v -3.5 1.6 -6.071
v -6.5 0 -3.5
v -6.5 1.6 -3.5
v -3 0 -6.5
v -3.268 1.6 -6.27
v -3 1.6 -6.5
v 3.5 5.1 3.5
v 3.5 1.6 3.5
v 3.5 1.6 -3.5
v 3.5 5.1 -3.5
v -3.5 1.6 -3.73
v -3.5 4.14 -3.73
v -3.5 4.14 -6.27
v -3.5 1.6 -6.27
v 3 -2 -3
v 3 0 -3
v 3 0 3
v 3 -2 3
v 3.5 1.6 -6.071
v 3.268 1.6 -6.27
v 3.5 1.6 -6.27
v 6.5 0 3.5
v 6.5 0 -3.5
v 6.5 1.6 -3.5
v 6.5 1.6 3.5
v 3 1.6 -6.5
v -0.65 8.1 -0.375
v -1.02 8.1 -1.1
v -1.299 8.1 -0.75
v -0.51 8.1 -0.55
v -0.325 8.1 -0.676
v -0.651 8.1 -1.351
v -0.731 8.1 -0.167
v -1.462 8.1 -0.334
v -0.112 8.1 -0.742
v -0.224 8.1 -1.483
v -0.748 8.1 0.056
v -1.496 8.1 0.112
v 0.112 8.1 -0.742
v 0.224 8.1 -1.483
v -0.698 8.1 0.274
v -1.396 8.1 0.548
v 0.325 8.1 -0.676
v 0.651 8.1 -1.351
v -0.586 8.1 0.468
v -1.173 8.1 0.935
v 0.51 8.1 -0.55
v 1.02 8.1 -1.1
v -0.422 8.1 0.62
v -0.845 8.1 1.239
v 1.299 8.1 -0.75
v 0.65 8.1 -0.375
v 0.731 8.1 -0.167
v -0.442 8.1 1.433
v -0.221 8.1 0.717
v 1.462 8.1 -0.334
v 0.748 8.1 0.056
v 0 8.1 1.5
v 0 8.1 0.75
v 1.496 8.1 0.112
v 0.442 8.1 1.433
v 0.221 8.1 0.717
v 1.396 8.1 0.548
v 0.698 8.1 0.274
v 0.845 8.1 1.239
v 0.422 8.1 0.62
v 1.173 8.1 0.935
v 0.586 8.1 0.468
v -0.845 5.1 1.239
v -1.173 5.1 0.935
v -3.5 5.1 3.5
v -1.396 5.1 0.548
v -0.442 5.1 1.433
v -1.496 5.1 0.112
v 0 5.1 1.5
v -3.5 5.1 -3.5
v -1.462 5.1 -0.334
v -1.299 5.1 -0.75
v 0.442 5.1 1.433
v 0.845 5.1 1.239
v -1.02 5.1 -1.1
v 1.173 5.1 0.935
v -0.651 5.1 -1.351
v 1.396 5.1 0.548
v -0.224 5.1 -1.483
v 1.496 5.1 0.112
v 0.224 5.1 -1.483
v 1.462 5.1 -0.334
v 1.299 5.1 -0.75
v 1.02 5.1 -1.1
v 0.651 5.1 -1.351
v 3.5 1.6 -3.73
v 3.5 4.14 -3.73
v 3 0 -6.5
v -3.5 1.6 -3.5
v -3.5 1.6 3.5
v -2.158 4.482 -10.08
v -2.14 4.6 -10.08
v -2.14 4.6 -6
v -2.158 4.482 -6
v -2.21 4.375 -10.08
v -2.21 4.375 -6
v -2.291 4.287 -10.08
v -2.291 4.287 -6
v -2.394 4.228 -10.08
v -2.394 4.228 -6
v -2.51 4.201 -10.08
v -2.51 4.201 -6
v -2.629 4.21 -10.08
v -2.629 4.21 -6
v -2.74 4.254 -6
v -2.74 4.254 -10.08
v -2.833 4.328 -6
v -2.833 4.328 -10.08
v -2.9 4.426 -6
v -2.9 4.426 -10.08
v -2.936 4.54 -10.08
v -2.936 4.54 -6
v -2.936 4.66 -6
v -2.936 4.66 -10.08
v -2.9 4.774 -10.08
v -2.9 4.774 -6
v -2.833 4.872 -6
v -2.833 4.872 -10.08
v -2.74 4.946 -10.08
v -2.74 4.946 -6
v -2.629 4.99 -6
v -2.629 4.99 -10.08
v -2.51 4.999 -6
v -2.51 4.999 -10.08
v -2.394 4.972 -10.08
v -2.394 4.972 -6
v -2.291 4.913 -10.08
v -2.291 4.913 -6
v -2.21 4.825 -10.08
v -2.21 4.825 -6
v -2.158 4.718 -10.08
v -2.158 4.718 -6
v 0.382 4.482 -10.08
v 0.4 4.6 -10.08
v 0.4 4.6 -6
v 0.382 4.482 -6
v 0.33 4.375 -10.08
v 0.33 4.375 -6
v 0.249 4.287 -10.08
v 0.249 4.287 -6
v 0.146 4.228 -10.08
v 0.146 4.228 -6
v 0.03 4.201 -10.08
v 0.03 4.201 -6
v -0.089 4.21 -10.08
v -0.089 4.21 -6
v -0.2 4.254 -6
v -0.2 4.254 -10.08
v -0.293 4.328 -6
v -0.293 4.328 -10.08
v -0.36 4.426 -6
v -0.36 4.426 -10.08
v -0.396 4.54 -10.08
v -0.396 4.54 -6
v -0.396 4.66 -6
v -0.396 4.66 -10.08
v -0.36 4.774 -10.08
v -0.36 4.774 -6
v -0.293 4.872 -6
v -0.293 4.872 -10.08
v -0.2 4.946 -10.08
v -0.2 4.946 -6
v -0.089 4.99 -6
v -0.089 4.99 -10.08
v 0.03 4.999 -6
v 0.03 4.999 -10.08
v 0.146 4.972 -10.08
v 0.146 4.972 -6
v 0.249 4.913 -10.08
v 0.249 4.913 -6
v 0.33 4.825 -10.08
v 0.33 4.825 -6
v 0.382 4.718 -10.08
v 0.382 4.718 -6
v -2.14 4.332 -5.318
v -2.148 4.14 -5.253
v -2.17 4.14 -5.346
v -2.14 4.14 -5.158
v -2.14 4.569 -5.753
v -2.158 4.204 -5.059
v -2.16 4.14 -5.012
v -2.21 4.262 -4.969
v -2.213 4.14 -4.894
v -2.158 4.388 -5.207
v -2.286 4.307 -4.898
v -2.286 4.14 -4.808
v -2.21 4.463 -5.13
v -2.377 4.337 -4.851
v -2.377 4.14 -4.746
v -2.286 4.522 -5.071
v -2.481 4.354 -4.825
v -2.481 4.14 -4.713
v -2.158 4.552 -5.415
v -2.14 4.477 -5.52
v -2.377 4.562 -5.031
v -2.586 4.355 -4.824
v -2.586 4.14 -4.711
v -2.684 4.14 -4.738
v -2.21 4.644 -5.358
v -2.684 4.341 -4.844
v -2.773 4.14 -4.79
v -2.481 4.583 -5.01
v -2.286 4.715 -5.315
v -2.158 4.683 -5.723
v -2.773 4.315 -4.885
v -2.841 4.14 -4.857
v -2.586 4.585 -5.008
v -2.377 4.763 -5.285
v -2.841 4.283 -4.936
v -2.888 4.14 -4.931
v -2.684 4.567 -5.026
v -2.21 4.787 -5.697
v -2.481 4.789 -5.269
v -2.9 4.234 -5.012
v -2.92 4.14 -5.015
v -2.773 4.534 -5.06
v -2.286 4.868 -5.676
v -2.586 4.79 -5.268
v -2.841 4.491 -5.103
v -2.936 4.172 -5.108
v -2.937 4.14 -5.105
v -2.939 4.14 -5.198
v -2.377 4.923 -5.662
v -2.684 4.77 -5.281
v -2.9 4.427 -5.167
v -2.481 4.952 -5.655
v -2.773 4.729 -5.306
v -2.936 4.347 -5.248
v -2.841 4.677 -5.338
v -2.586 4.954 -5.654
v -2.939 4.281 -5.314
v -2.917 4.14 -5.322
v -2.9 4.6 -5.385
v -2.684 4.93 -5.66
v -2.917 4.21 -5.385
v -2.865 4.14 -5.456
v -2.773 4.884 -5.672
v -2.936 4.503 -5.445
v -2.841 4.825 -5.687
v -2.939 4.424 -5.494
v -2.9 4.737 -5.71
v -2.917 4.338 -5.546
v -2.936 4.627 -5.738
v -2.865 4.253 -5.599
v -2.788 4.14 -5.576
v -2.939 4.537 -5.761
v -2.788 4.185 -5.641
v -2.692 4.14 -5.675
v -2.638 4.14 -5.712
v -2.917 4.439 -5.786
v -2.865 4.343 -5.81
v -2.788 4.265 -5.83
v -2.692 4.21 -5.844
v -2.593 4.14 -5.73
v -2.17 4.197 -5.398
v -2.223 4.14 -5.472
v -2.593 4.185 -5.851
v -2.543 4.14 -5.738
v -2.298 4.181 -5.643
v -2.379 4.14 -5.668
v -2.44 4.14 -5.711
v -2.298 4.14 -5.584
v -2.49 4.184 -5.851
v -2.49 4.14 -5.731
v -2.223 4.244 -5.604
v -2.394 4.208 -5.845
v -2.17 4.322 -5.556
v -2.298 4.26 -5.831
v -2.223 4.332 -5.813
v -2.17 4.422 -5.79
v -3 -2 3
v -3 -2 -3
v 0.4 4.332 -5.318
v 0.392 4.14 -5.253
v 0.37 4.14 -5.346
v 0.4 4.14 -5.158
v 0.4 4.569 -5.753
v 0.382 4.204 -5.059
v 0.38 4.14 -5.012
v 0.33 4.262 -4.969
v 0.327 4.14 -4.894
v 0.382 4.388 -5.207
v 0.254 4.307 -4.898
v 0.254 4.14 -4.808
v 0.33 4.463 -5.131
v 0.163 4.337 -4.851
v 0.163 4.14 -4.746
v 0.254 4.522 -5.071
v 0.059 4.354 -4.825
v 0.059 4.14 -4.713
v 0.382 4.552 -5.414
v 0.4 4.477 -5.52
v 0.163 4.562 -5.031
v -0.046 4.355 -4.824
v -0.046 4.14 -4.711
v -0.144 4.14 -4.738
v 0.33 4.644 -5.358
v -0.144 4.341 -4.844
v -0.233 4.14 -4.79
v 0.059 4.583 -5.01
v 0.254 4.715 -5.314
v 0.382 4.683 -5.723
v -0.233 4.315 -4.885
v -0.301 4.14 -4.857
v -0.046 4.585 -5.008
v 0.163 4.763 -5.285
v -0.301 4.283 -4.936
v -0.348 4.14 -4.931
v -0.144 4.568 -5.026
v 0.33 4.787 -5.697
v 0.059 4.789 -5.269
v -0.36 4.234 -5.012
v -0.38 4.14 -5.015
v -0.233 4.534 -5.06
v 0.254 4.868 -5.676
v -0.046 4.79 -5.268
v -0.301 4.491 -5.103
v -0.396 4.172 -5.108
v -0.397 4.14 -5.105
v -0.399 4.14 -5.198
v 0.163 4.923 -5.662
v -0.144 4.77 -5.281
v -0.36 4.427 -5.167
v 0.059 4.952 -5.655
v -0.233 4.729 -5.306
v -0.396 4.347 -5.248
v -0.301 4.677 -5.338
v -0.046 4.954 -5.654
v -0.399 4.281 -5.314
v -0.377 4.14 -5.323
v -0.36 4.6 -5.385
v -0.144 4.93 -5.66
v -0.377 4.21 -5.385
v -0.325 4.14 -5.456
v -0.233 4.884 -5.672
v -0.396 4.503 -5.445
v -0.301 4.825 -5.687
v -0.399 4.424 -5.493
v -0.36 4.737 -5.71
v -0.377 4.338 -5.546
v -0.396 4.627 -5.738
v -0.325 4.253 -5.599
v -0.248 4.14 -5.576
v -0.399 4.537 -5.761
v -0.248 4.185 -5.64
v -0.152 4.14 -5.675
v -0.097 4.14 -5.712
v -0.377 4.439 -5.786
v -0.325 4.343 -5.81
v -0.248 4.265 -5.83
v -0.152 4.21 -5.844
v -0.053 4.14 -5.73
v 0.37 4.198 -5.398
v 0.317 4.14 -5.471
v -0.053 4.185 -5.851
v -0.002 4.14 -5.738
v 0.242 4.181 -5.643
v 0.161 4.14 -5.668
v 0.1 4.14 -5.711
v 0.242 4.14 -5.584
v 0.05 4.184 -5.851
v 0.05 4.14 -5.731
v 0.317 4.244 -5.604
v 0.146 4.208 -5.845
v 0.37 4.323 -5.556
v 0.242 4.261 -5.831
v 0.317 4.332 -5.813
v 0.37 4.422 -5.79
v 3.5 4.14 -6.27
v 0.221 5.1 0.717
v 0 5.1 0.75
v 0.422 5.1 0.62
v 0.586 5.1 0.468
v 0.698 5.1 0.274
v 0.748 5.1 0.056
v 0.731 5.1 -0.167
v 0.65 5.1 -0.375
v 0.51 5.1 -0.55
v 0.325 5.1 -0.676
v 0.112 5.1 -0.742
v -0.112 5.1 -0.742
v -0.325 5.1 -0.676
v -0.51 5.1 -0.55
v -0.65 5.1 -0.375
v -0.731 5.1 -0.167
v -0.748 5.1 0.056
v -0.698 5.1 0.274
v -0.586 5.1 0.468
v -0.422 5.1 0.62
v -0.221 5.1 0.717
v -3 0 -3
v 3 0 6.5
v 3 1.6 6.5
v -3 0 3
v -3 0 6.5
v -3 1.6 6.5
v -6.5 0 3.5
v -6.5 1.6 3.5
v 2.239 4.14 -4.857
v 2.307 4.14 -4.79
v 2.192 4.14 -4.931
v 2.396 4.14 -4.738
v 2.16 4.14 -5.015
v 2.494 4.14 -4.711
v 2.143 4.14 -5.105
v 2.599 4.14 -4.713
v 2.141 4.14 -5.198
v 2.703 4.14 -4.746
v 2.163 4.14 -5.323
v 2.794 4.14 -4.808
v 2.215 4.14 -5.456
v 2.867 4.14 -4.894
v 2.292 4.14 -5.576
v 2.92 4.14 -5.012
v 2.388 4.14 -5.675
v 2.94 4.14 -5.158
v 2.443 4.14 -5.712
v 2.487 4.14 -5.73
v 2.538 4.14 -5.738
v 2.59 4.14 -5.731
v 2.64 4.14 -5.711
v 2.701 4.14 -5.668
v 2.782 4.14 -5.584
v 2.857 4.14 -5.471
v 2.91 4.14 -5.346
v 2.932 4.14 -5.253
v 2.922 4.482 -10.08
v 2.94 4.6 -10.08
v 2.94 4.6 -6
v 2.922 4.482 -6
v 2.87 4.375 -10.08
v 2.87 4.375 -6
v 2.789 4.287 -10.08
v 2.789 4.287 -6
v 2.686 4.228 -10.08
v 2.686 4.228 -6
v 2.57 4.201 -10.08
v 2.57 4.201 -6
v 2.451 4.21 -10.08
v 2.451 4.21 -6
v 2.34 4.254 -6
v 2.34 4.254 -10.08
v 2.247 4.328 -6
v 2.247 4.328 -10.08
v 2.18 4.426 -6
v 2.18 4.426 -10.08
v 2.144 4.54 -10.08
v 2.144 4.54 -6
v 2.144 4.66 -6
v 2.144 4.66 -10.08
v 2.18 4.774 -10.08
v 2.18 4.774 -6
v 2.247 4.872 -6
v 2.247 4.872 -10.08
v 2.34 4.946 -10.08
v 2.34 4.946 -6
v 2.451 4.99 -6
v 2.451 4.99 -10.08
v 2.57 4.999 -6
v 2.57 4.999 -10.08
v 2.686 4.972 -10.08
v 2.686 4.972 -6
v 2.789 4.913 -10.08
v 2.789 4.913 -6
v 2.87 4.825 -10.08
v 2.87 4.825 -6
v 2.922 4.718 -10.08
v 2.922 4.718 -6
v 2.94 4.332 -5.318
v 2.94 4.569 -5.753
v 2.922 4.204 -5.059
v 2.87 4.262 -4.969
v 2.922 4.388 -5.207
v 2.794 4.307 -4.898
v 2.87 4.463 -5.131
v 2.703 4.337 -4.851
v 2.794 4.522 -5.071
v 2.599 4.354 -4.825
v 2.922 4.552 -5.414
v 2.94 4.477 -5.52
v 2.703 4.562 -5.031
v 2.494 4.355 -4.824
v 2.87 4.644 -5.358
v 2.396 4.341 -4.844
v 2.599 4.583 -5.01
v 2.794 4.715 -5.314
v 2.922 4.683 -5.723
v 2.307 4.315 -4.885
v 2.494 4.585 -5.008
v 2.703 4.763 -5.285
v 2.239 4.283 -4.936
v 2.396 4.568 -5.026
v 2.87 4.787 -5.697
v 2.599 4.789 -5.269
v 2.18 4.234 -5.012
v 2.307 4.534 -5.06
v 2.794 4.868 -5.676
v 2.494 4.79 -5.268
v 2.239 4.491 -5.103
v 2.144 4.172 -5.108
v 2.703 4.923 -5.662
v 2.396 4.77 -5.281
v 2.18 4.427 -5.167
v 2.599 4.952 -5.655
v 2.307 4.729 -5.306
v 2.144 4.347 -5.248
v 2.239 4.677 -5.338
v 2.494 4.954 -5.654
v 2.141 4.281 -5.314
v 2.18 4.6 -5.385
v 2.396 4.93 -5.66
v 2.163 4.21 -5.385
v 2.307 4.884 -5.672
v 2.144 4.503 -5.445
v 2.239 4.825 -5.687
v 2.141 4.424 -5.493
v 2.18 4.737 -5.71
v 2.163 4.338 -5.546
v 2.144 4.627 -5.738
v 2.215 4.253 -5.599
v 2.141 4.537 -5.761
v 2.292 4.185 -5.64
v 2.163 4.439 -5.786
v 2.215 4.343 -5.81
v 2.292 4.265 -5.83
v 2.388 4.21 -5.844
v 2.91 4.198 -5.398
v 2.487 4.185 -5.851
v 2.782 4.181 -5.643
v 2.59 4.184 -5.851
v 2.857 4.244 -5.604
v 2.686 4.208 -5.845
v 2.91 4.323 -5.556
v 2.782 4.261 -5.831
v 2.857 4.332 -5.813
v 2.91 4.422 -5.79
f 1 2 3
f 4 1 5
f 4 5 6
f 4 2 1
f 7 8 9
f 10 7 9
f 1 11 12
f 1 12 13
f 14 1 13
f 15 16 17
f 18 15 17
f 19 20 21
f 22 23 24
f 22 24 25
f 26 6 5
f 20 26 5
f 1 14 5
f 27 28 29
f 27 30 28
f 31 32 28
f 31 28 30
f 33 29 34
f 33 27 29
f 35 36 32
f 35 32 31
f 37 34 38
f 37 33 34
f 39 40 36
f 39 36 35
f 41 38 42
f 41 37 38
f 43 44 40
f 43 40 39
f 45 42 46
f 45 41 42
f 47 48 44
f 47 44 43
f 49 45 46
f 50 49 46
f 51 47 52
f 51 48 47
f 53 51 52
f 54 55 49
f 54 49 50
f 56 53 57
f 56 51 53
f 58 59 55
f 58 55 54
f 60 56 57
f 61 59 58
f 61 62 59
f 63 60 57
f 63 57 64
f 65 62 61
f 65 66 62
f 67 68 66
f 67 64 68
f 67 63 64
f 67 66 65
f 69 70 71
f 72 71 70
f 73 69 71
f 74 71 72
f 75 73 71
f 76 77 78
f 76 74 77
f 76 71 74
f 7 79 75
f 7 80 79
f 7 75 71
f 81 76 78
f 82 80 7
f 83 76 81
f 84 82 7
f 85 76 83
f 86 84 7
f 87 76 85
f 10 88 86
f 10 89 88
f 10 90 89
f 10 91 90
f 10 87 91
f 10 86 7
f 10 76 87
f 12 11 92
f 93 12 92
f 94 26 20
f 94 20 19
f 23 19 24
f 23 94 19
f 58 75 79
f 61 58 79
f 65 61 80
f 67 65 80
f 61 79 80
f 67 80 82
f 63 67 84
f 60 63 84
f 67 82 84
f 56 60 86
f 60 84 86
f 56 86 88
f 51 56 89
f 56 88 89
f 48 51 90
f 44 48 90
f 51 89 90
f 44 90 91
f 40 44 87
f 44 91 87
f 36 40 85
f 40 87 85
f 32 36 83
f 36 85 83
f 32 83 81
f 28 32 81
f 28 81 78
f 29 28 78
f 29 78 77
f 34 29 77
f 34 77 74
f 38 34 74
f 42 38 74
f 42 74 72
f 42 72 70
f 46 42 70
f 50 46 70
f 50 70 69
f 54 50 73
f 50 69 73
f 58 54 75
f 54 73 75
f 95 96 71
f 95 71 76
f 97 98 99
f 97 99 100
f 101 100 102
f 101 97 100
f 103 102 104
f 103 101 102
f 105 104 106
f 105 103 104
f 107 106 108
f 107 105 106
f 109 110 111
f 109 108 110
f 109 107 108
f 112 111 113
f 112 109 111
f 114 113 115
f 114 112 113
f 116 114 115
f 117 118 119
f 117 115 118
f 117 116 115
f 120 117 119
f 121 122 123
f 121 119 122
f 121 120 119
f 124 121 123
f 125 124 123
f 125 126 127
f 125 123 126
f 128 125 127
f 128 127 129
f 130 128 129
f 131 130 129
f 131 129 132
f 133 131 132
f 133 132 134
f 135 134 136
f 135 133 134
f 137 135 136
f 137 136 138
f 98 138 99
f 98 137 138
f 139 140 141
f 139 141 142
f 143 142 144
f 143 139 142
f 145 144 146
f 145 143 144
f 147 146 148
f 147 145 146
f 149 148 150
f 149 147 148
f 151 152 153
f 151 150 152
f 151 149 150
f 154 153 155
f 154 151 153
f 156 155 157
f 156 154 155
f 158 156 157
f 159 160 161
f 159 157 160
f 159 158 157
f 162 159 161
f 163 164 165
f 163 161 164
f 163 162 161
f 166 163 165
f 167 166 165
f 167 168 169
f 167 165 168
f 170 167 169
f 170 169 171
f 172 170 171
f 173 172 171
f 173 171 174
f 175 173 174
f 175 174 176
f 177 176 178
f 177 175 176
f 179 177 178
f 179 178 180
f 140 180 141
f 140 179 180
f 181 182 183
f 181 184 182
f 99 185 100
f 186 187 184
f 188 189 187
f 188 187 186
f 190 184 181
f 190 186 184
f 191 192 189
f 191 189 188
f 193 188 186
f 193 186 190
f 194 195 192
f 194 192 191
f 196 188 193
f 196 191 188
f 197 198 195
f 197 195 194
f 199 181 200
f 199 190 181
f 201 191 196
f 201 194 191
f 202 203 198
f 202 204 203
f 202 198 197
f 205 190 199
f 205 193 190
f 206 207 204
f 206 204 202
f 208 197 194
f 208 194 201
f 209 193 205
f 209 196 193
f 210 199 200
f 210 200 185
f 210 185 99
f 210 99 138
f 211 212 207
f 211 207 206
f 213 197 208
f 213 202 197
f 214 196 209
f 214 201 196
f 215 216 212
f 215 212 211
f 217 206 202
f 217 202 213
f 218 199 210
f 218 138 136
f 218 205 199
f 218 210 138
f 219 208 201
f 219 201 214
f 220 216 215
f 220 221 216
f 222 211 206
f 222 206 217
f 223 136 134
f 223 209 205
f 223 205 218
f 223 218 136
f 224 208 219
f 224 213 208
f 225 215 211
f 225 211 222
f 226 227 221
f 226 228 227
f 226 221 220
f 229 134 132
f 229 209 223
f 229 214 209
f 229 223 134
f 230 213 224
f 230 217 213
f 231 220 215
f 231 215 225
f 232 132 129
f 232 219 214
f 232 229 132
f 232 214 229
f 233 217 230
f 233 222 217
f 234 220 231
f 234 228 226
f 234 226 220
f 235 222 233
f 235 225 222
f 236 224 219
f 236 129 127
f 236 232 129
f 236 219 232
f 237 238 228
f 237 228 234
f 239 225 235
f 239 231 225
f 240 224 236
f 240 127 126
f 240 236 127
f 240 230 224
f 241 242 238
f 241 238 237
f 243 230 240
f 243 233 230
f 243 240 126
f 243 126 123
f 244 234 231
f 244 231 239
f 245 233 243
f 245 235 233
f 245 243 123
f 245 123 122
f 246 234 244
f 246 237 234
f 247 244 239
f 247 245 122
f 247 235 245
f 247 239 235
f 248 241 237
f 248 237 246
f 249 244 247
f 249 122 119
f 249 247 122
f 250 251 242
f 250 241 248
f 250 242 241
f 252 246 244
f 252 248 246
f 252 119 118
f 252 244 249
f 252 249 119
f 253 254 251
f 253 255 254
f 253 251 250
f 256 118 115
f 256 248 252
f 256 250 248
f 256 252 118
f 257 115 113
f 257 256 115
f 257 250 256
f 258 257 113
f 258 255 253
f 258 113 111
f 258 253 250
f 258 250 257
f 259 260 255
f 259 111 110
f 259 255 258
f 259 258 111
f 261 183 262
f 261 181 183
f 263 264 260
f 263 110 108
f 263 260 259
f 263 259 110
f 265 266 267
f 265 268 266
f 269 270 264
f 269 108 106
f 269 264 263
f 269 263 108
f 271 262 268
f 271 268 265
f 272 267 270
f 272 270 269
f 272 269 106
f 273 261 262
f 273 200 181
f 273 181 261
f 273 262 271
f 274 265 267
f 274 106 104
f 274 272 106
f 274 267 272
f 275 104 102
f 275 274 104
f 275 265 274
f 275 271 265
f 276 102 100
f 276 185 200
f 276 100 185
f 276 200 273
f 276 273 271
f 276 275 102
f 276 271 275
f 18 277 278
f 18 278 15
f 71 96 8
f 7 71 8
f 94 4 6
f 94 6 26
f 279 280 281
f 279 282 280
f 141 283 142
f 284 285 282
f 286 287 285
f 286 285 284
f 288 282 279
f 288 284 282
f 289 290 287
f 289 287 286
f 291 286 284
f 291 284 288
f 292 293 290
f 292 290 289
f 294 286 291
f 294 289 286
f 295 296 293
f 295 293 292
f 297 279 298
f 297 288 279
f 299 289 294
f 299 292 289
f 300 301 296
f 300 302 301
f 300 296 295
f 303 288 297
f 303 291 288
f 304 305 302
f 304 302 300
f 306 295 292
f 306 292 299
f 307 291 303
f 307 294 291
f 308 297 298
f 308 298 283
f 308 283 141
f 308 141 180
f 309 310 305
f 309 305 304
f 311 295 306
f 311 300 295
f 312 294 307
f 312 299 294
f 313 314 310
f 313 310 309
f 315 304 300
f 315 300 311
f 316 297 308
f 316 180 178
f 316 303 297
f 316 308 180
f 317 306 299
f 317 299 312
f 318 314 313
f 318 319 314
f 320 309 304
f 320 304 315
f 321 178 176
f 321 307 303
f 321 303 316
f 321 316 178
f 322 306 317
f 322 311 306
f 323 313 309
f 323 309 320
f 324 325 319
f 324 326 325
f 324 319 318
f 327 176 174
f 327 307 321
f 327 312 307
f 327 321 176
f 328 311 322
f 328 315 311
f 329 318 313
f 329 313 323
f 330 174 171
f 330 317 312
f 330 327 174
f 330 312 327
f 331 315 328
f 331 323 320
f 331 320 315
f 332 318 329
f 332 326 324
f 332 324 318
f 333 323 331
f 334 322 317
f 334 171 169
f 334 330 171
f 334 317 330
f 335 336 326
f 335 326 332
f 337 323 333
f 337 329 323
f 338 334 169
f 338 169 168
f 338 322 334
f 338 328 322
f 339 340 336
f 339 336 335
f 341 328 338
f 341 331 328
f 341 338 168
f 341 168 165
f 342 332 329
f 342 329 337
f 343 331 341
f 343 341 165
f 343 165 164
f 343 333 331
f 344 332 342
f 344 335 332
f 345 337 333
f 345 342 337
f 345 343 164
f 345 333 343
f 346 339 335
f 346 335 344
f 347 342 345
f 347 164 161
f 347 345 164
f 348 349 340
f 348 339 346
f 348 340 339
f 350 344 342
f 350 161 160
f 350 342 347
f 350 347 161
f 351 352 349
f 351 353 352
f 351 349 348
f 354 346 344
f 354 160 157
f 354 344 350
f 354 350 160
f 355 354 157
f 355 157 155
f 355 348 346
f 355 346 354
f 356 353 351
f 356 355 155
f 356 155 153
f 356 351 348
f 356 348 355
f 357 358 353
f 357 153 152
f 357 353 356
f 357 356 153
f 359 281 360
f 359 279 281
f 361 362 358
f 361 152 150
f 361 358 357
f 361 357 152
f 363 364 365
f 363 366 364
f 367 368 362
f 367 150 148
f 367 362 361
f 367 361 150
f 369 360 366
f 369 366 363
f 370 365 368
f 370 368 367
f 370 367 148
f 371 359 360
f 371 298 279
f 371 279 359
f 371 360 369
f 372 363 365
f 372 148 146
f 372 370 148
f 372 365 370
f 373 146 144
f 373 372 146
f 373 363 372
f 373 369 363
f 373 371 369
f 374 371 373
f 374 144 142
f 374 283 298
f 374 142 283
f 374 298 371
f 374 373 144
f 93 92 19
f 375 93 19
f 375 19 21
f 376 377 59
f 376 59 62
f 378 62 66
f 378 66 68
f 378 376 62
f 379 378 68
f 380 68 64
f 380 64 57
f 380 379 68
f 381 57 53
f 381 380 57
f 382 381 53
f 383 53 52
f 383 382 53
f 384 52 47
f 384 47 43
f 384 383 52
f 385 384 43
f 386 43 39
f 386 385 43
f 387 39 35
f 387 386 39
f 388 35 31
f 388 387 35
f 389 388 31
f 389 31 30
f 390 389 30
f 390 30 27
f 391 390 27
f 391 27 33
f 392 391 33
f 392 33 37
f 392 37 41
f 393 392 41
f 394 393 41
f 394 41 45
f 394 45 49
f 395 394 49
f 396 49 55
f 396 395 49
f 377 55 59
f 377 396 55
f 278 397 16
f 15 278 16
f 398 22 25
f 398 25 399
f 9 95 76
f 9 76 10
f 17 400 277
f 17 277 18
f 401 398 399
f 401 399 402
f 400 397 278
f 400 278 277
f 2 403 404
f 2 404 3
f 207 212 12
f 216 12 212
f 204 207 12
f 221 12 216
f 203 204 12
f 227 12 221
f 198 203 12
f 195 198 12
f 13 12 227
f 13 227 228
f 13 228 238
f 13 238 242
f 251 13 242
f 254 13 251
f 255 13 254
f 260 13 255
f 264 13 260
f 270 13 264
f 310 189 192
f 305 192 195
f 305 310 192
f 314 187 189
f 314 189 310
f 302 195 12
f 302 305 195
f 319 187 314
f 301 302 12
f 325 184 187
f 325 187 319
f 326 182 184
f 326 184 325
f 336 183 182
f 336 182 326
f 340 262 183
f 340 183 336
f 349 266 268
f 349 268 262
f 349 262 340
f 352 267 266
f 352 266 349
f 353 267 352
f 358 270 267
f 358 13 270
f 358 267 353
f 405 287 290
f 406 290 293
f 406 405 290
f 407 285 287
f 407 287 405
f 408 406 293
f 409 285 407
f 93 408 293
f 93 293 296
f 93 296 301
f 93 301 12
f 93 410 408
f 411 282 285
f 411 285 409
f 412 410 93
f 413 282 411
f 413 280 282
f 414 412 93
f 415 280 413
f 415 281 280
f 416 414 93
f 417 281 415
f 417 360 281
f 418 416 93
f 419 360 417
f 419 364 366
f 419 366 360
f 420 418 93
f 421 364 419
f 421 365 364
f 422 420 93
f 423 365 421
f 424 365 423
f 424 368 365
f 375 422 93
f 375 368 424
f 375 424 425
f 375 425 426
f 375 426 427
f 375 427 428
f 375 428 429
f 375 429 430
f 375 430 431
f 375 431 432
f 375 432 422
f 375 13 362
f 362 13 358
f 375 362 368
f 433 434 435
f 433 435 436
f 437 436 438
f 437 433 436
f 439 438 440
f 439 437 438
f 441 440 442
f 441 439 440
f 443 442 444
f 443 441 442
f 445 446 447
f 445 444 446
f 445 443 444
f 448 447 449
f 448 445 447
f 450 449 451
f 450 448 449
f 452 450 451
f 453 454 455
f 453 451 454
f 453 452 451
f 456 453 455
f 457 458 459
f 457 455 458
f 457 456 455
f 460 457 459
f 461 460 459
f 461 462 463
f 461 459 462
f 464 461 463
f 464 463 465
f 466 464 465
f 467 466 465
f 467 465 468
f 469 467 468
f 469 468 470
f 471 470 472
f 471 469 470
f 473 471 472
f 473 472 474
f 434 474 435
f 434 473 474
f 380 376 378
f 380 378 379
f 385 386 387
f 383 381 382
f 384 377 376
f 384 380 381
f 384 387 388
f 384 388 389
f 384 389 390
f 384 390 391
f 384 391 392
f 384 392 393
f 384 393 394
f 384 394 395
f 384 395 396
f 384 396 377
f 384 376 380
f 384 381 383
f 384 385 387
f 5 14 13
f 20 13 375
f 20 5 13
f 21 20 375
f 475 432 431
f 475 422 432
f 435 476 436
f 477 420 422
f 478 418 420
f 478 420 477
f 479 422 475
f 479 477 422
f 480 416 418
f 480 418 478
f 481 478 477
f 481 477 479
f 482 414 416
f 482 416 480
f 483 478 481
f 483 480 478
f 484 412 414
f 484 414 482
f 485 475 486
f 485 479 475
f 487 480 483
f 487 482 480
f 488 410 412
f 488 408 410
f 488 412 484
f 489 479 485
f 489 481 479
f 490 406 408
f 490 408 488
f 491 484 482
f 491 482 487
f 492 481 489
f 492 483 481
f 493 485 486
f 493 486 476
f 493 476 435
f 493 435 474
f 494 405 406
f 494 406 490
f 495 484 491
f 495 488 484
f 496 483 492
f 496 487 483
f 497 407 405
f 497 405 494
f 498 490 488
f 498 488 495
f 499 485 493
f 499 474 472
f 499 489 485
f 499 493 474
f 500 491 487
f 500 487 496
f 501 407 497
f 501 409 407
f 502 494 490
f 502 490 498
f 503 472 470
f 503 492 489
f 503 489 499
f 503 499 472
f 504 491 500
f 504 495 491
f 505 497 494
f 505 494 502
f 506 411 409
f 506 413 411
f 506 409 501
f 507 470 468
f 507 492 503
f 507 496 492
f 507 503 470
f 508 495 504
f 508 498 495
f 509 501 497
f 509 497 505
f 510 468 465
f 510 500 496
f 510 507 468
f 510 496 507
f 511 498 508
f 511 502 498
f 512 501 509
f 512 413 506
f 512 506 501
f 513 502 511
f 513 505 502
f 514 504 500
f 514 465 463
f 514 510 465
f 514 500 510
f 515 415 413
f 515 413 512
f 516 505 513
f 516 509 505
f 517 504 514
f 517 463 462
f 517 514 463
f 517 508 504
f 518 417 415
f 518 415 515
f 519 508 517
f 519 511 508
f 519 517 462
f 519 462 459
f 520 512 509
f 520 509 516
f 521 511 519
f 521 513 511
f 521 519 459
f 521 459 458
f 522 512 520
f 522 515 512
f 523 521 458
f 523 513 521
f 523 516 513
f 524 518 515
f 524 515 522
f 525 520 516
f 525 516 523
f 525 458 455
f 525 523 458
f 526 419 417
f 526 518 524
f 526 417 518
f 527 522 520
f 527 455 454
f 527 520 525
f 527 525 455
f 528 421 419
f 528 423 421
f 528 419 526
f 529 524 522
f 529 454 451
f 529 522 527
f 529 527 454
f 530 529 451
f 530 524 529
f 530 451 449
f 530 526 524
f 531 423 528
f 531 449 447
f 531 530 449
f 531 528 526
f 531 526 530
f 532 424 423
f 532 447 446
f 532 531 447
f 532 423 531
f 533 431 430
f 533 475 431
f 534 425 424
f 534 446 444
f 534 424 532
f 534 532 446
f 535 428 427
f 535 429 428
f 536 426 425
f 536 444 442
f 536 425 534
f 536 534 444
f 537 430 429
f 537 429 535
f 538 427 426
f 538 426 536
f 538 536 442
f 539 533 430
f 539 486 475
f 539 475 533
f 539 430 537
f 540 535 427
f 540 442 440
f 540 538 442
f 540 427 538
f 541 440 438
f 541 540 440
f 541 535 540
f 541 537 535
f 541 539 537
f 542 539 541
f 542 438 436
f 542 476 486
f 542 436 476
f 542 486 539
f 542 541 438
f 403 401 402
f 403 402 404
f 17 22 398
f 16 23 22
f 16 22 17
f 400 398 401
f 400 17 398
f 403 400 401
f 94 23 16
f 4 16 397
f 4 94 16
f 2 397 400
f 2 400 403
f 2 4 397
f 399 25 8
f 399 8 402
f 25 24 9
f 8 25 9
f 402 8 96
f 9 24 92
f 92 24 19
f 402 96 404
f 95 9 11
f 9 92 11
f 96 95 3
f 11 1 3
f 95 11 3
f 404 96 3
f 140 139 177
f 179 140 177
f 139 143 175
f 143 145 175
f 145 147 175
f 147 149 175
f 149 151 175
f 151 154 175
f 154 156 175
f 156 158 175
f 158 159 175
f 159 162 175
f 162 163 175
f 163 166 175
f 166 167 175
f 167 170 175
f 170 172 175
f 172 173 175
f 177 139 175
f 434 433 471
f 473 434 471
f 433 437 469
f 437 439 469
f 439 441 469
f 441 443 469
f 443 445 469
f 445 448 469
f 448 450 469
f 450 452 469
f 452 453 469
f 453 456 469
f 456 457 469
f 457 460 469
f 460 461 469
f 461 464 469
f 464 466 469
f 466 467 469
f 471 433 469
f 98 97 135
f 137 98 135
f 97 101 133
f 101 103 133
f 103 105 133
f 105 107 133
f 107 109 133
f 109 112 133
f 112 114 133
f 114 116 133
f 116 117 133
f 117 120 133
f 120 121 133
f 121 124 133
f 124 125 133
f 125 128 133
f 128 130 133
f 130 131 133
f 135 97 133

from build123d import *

# Parameters (mm, degrees)
EXTRUDE_362_DEPTH          = 1.6
SKETCH_2_W                 = 7
SKETCH_2_H                 = 7
EXTRUDE_2_DEPTH            = 3.5
SKETCH_3_R                 = 1.5
SKETCH_3_R_2               = 0.75
EXTRUDE_3_DEPTH            = 3
SKETCH_6_W                 = 6
SKETCH_6_H                 = 6
EXTRUDE_6_DEPTH            = 2
SKETCH_4_R                 = 0.4
PATTERN_LINEAR_1_COUNT     = 2
PATTERN_LINEAR_1_PITCH     = 2.54
PATTERN_LINEAR_1_COL_COUNT = 2
PATTERN_LINEAR_1_COL_PITCH = 2.54
SKETCH_8_W                 = 7
SKETCH_8_H                 = 2.54
EXTRUDE_7_DEPTH            = 2.54


with BuildPart() as part:
    # Эскиз1 → Extrude 362 (new body)
    with BuildSketch(Plane(origin=(0, 0, 0), x_dir=(1, 0, 0), z_dir=(0, 1, 0))):
        Polygon((-3, 6.5), (3, 6.5), (6.5, 3.5), (6.5, -3.5), (3, -6.5), (-3, -6.5), (-6.5, -3.5), (-6.5, 3.5), align=None)
    extrude(amount=EXTRUDE_362_DEPTH)

    # Эскиз2 → Бобышка-Вытянуть2 (add)
    with BuildSketch(Plane(origin=(0, 1.6, 0), x_dir=(1, 0, 0), z_dir=(0, 1, 0))):
        Rectangle(SKETCH_2_W, SKETCH_2_H)
    extrude(amount=EXTRUDE_2_DEPTH)

    # Эскиз3 → Бобышка-Вытянуть3 (add)
    with BuildSketch(Plane(origin=(0, 5.1, 0), x_dir=(1, 0, 0), z_dir=(0, 1, 0))):
        with Locations(Location((0, 0, 0), (0, 0, 270))):
            Circle(SKETCH_3_R)
        with Locations(Location((0, 0, 0), (0, 0, 270))):
            Circle(SKETCH_3_R_2, mode=Mode.SUBTRACT)
    extrude(amount=EXTRUDE_3_DEPTH)

    # Эскиз6 → Бобышка-Вытянуть6 (add)
    with BuildSketch(Plane.XZ):
        Rectangle(SKETCH_6_W, SKETCH_6_H)
    extrude(amount=EXTRUDE_6_DEPTH)

    # По траектории1: sweep along a path in Эскиз7
    with BuildLine(Plane(origin=(0, 0, 0), x_dir=(0, 0, -1), z_dir=(1, 0, 0))) as sweep_1_path:
        Line((5, 1.6), (5, 3.6))
        ThreePointArc((5, 3.6), (5.292893219, 4.307106781), (6, 4.6))
        Line((6, 4.6), (10.08, 4.6))
    # Эскиз4 → По траектории1 (sweep)
    with BuildSketch(Plane.XZ.offset(-1.6)):
        with Locations((0, -5)):
            Circle(SKETCH_4_R)
    sweep_1 = sweep(path=sweep_1_path.line)

    # Линейный массив1: По траектории1 ×2
    with Locations(*[(i * PATTERN_LINEAR_1_PITCH, 0, 0) for i in range(1, PATTERN_LINEAR_1_COUNT)]):
        add(sweep_1)

    # Линейный массив1 col: По траектории1 ×2
    with Locations(*[(-i * PATTERN_LINEAR_1_COL_PITCH, 0, 0) for i in range(1, PATTERN_LINEAR_1_COL_COUNT)]):
        add(sweep_1)

    # Эскиз8 → Бобышка-Вытянуть7 (add)
    with BuildSketch(Plane(origin=(0, 1.6, 0), x_dir=(1, 0, 0), z_dir=(0, 1, 0))):
        with Locations((0, 5)):
            Rectangle(SKETCH_8_W, SKETCH_8_H)
    extrude(amount=EXTRUDE_7_DEPTH)


solid = part.part
